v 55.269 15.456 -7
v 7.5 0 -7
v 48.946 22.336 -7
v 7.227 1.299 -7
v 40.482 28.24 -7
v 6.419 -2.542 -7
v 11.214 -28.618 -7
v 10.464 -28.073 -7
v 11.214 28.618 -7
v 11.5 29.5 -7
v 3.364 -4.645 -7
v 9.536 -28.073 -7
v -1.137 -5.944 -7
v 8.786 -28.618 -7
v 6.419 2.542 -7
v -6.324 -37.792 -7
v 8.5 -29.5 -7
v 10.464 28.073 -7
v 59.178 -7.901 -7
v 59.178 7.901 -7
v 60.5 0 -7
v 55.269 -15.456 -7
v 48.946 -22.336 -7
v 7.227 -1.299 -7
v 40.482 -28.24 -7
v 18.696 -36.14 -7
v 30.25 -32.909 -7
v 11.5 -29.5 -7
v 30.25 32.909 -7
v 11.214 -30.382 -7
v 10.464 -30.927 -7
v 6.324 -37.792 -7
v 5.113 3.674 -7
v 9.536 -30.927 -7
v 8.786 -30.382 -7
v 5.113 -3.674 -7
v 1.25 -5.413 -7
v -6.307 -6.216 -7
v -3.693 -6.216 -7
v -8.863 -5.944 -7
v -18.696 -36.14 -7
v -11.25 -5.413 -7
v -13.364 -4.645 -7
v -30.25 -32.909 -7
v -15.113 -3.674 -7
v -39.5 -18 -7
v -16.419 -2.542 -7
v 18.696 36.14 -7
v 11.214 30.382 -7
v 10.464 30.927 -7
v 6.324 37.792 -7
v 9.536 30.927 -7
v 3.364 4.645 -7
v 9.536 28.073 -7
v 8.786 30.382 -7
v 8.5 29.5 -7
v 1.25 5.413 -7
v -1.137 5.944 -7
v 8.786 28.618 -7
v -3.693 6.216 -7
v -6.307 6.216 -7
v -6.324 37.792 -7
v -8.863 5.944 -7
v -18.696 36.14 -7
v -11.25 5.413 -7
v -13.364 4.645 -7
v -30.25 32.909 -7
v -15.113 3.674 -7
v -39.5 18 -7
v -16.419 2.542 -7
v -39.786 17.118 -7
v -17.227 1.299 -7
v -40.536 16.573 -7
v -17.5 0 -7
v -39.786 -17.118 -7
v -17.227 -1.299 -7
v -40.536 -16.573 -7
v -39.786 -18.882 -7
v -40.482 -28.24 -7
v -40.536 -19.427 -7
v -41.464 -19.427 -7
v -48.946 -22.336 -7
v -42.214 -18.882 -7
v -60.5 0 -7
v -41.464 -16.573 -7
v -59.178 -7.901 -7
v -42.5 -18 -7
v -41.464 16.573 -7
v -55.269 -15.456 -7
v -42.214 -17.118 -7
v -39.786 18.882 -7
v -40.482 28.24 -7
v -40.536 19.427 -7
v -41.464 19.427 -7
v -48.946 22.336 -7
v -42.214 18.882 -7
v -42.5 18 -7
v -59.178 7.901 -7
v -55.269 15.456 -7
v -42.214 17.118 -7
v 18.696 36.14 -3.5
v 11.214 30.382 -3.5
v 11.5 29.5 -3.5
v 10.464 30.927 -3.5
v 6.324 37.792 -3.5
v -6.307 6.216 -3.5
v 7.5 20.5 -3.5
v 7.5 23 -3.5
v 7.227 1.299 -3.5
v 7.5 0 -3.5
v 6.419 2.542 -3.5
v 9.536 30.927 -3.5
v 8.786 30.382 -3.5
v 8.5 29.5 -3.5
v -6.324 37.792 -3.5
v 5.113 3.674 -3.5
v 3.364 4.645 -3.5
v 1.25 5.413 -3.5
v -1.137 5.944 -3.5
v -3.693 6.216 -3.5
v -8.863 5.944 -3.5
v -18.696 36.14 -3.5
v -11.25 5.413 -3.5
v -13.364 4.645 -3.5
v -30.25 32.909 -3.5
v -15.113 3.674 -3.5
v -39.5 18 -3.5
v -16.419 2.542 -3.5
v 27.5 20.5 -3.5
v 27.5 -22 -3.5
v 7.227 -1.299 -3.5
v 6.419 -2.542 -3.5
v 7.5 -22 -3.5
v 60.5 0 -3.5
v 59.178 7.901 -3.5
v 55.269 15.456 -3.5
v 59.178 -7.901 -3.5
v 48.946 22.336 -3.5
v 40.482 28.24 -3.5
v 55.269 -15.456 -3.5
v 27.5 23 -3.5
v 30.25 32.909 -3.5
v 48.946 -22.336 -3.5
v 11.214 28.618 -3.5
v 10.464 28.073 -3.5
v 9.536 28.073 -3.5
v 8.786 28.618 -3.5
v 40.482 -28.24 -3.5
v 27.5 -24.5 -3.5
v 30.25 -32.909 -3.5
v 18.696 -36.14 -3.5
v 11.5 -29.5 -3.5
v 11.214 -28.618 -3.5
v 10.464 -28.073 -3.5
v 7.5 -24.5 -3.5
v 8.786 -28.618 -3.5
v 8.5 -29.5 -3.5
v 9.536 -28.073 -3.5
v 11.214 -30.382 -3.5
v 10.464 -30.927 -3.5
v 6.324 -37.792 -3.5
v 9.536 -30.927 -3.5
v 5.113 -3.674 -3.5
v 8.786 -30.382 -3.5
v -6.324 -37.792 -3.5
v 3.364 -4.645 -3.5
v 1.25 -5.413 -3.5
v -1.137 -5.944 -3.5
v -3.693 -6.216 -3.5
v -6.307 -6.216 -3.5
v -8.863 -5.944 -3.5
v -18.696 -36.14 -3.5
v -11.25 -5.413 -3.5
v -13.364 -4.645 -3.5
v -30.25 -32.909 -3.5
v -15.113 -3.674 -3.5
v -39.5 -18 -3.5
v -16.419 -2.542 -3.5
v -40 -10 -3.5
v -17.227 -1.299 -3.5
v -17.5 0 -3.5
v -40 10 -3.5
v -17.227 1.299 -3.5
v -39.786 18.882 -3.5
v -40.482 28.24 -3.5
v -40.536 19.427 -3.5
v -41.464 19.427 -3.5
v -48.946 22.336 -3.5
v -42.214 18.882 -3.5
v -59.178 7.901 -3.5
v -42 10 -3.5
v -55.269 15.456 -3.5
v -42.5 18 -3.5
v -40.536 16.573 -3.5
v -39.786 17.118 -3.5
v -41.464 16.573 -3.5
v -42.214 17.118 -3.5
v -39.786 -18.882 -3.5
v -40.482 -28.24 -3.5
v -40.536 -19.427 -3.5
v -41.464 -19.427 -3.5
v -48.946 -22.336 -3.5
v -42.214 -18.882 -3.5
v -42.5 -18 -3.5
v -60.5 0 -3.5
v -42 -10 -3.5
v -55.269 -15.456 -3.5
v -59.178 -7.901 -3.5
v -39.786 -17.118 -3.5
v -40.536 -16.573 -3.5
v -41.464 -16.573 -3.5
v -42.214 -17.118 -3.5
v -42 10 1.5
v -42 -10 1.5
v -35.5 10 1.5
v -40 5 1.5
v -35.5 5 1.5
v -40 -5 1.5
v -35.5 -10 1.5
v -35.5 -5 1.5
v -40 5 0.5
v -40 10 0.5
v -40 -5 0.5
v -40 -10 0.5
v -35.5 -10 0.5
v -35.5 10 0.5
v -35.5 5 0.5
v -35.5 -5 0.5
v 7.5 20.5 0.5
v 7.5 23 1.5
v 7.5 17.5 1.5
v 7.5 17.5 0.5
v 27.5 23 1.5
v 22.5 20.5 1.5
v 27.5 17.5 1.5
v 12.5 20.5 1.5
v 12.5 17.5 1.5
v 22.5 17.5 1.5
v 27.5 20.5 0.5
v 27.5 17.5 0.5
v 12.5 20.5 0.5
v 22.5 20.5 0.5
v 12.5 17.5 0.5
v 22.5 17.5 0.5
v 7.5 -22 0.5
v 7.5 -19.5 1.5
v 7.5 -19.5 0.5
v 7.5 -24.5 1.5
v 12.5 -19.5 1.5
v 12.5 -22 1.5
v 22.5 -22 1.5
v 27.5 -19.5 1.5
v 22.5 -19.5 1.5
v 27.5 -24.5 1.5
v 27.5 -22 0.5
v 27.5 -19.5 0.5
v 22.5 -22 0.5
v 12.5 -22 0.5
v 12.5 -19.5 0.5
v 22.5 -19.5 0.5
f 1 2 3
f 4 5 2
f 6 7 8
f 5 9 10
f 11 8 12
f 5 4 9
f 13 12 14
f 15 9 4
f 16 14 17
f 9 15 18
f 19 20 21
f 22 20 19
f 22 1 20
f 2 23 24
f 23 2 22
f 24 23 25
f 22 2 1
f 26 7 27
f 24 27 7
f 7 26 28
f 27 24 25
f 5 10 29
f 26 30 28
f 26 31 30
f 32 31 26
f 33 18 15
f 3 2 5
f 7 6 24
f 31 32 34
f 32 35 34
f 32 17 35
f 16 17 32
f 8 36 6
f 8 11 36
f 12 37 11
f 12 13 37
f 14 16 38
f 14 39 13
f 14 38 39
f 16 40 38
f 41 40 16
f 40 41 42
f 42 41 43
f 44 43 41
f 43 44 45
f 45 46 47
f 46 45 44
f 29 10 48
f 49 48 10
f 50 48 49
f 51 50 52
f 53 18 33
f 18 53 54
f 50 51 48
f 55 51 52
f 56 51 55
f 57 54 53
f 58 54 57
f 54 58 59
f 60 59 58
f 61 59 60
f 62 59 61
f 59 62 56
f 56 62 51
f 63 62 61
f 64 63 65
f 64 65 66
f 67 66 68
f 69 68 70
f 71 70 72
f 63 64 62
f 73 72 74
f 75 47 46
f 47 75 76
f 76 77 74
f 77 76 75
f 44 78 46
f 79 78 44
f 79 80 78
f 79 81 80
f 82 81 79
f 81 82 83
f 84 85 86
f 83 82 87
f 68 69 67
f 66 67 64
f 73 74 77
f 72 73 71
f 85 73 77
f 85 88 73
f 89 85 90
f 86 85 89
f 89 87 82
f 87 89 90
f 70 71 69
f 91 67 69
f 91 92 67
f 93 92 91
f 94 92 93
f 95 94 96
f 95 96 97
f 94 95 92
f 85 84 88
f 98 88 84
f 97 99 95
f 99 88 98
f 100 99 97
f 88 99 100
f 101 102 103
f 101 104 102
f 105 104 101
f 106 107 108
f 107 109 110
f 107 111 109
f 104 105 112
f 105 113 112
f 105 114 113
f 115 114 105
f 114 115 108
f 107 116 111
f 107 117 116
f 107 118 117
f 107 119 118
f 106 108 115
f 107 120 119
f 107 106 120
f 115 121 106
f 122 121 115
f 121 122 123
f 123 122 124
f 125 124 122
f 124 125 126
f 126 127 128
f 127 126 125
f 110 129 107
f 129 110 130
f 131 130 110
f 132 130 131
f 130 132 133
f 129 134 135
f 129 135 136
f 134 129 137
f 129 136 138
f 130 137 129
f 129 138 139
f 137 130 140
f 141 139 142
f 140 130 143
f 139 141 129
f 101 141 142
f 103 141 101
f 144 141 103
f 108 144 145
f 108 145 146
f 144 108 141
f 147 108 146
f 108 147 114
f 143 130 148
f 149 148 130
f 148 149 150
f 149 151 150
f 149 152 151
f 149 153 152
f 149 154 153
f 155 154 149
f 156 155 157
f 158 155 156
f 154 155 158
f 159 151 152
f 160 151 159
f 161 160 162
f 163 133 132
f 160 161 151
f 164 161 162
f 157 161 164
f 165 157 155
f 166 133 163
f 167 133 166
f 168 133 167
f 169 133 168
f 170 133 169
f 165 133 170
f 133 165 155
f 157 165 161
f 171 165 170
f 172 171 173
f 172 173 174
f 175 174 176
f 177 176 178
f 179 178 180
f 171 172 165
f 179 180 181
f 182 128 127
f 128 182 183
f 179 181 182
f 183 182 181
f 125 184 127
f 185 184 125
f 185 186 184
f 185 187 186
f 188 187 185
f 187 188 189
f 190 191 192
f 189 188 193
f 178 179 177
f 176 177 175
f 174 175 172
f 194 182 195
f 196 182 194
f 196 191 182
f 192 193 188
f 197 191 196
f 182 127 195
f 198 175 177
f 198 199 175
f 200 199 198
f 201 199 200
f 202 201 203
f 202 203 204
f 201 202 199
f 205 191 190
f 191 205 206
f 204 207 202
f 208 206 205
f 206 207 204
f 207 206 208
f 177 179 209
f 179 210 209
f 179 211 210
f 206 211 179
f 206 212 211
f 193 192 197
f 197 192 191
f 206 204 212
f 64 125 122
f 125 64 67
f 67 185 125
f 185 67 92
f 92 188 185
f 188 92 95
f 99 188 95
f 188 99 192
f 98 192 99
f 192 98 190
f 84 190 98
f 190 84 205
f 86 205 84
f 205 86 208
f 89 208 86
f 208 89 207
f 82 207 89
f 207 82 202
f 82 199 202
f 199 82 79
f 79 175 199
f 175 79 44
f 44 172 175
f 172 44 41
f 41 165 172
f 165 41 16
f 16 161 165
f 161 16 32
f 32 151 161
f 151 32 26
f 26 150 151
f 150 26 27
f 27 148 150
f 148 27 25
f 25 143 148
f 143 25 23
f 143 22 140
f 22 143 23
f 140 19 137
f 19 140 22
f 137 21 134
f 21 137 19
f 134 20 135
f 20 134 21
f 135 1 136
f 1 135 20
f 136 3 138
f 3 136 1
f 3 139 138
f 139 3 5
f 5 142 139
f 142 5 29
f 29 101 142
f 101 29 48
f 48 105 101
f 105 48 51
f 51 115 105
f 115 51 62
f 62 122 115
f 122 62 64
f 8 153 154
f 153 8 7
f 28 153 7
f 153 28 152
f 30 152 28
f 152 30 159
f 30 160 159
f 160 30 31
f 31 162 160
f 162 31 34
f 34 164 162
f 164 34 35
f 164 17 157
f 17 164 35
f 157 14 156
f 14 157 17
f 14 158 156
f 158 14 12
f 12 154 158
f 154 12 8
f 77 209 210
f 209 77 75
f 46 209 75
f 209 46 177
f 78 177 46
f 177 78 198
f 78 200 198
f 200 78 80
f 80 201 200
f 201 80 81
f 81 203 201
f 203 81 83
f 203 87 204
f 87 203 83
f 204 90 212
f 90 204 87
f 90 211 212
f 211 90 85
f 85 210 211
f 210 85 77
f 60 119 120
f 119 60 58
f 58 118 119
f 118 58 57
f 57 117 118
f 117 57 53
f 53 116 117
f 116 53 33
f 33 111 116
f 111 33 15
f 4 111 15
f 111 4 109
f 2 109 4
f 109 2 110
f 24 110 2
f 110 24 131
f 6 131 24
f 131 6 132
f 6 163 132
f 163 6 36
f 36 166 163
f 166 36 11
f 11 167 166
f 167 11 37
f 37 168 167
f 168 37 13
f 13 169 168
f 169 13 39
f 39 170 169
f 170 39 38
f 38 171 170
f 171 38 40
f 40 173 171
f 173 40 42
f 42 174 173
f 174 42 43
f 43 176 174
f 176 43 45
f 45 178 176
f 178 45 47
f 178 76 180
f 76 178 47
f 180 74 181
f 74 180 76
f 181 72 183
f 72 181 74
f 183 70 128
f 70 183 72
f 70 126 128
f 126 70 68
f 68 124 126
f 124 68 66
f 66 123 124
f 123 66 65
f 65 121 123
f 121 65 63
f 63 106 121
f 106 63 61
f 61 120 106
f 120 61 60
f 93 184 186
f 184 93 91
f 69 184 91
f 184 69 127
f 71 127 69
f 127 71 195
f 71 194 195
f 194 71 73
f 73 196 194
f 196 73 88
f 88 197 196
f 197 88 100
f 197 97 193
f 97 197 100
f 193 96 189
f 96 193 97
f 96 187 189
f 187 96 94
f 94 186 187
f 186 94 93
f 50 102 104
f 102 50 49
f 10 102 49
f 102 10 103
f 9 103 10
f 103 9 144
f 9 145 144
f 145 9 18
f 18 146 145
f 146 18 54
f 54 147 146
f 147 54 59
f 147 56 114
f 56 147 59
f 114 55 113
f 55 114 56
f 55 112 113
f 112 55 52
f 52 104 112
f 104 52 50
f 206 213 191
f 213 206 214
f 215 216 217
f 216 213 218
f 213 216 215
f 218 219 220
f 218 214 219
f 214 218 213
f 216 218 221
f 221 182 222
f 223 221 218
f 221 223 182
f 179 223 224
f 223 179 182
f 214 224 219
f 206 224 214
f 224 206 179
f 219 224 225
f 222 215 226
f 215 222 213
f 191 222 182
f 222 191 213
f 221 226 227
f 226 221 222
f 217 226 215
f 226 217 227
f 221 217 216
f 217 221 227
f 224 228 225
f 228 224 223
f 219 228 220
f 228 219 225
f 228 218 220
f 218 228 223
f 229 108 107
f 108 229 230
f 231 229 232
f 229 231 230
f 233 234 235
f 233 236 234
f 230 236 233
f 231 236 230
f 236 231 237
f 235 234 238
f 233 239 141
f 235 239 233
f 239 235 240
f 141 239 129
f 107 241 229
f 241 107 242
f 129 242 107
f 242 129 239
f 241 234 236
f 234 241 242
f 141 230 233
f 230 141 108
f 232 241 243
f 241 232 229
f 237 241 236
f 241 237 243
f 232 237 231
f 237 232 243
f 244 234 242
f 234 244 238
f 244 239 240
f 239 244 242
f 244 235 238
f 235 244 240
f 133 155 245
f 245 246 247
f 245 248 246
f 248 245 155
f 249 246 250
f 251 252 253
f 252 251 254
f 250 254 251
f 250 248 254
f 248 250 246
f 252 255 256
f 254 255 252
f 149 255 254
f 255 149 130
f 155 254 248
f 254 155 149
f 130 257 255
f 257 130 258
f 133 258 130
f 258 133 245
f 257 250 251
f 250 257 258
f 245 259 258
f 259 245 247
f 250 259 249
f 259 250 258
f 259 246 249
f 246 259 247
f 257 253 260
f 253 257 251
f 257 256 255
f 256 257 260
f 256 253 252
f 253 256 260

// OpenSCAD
// [FL_INDEX: keywords="openscad, 3d_parametric, 3D_Mouse_bottom, csg_solid" | COT="Parametric OpenSCAD design from 3DCodeverse"]
// Title: 3D Mouse bottom

//fn = 100;

bottom_back_connector_position = 80;//[35:105]
bottom_left_connector_position = -46;//[-56:-26]
bottom_right_connector_position = 44;//[24:52]
bottom_length = 10.8;//[10.8,10.9,11,11.1,11.2,11.3,11.4,11.5]
bottom_width = 6.8;//[6.8,6.9,7,7.1,7.2]
bottom_height = 7;//[7,8,9]
bottom_hole_radius = 25;//[15:25]
bottom_hole_length = 1;//[0.7,0.8,0.9,1,1.1,1.2,1.3,1.4,1.5]
bottom_hole_width = 0.5;//[0.3,0.4,0.5,0.6,0.7,0.8]
screw_hole_size = 3;//[1,2,3,4]

module bottom()
{
//MAIN BOTTOM PART
linear_extrude(bottom_height)
difference()
{
scale([bottom_length+1.3,bottom_width+0.8,0])
circle(10);

//HOLE FOR SENSOR
scale([bottom_hole_length,bottom_hole_width,6])	
translate([10,0,0])
circle(bottom_hole_radius);

//FRONT SCREW HOLES
//LEFT
scale([1,1,15])
translate([-20,-59,0])
circle(screw_hole_size);
//RIGHT
scale([1,1,15])
translate([-20,59,0])
circle(screw_hole_size);

//BACK SCREW HOLES
//LEFT
scale(1,1,6)
translate([82,-36,0])
circle(screw_hole_size);
//RIGHT
scale(1,1,6)
translate([82,36,0])
circle(screw_hole_size);

//HOLE FOR LITTLE FINGER
scale([3,1,1])
translate([-12.5,bottom_width*18,0])
circle(7);
}

//BOTTOM SUPPORT

//BACK
//long
translate([bottom_back_connector_position,-20,7])
cube([4,40,10]);
//left
translate([bottom_back_connector_position-9,-20,15])
cube([10,10,2]);
//right
translate([bottom_back_connector_position-9,10,15])
cube([10,10,2]);

//LEFT
//long
translate([-55,bottom_left_connector_position,7])
cube([40,5,10]);
//right
translate([-25,bottom_left_connector_position+1 ,15])
cube([10,10,2]);
//left
translate([-55,bottom_left_connector_position+1,15])
cube([10,10,2]);

//RIGHT
//long
translate([-55,bottom_right_connector_position,7])
cube([40,5,10]);
//left
translate([-25,bottom_right_connector_position-5,15])
cube([10,10,2]);
//right
translate([-55,bottom_right_connector_position-5,15])
cube([10,10,2]);

}
//========================================//
scale(0.5)
{
rotate([0,0,180])
translate([0,0,-14])
bottom();
}
